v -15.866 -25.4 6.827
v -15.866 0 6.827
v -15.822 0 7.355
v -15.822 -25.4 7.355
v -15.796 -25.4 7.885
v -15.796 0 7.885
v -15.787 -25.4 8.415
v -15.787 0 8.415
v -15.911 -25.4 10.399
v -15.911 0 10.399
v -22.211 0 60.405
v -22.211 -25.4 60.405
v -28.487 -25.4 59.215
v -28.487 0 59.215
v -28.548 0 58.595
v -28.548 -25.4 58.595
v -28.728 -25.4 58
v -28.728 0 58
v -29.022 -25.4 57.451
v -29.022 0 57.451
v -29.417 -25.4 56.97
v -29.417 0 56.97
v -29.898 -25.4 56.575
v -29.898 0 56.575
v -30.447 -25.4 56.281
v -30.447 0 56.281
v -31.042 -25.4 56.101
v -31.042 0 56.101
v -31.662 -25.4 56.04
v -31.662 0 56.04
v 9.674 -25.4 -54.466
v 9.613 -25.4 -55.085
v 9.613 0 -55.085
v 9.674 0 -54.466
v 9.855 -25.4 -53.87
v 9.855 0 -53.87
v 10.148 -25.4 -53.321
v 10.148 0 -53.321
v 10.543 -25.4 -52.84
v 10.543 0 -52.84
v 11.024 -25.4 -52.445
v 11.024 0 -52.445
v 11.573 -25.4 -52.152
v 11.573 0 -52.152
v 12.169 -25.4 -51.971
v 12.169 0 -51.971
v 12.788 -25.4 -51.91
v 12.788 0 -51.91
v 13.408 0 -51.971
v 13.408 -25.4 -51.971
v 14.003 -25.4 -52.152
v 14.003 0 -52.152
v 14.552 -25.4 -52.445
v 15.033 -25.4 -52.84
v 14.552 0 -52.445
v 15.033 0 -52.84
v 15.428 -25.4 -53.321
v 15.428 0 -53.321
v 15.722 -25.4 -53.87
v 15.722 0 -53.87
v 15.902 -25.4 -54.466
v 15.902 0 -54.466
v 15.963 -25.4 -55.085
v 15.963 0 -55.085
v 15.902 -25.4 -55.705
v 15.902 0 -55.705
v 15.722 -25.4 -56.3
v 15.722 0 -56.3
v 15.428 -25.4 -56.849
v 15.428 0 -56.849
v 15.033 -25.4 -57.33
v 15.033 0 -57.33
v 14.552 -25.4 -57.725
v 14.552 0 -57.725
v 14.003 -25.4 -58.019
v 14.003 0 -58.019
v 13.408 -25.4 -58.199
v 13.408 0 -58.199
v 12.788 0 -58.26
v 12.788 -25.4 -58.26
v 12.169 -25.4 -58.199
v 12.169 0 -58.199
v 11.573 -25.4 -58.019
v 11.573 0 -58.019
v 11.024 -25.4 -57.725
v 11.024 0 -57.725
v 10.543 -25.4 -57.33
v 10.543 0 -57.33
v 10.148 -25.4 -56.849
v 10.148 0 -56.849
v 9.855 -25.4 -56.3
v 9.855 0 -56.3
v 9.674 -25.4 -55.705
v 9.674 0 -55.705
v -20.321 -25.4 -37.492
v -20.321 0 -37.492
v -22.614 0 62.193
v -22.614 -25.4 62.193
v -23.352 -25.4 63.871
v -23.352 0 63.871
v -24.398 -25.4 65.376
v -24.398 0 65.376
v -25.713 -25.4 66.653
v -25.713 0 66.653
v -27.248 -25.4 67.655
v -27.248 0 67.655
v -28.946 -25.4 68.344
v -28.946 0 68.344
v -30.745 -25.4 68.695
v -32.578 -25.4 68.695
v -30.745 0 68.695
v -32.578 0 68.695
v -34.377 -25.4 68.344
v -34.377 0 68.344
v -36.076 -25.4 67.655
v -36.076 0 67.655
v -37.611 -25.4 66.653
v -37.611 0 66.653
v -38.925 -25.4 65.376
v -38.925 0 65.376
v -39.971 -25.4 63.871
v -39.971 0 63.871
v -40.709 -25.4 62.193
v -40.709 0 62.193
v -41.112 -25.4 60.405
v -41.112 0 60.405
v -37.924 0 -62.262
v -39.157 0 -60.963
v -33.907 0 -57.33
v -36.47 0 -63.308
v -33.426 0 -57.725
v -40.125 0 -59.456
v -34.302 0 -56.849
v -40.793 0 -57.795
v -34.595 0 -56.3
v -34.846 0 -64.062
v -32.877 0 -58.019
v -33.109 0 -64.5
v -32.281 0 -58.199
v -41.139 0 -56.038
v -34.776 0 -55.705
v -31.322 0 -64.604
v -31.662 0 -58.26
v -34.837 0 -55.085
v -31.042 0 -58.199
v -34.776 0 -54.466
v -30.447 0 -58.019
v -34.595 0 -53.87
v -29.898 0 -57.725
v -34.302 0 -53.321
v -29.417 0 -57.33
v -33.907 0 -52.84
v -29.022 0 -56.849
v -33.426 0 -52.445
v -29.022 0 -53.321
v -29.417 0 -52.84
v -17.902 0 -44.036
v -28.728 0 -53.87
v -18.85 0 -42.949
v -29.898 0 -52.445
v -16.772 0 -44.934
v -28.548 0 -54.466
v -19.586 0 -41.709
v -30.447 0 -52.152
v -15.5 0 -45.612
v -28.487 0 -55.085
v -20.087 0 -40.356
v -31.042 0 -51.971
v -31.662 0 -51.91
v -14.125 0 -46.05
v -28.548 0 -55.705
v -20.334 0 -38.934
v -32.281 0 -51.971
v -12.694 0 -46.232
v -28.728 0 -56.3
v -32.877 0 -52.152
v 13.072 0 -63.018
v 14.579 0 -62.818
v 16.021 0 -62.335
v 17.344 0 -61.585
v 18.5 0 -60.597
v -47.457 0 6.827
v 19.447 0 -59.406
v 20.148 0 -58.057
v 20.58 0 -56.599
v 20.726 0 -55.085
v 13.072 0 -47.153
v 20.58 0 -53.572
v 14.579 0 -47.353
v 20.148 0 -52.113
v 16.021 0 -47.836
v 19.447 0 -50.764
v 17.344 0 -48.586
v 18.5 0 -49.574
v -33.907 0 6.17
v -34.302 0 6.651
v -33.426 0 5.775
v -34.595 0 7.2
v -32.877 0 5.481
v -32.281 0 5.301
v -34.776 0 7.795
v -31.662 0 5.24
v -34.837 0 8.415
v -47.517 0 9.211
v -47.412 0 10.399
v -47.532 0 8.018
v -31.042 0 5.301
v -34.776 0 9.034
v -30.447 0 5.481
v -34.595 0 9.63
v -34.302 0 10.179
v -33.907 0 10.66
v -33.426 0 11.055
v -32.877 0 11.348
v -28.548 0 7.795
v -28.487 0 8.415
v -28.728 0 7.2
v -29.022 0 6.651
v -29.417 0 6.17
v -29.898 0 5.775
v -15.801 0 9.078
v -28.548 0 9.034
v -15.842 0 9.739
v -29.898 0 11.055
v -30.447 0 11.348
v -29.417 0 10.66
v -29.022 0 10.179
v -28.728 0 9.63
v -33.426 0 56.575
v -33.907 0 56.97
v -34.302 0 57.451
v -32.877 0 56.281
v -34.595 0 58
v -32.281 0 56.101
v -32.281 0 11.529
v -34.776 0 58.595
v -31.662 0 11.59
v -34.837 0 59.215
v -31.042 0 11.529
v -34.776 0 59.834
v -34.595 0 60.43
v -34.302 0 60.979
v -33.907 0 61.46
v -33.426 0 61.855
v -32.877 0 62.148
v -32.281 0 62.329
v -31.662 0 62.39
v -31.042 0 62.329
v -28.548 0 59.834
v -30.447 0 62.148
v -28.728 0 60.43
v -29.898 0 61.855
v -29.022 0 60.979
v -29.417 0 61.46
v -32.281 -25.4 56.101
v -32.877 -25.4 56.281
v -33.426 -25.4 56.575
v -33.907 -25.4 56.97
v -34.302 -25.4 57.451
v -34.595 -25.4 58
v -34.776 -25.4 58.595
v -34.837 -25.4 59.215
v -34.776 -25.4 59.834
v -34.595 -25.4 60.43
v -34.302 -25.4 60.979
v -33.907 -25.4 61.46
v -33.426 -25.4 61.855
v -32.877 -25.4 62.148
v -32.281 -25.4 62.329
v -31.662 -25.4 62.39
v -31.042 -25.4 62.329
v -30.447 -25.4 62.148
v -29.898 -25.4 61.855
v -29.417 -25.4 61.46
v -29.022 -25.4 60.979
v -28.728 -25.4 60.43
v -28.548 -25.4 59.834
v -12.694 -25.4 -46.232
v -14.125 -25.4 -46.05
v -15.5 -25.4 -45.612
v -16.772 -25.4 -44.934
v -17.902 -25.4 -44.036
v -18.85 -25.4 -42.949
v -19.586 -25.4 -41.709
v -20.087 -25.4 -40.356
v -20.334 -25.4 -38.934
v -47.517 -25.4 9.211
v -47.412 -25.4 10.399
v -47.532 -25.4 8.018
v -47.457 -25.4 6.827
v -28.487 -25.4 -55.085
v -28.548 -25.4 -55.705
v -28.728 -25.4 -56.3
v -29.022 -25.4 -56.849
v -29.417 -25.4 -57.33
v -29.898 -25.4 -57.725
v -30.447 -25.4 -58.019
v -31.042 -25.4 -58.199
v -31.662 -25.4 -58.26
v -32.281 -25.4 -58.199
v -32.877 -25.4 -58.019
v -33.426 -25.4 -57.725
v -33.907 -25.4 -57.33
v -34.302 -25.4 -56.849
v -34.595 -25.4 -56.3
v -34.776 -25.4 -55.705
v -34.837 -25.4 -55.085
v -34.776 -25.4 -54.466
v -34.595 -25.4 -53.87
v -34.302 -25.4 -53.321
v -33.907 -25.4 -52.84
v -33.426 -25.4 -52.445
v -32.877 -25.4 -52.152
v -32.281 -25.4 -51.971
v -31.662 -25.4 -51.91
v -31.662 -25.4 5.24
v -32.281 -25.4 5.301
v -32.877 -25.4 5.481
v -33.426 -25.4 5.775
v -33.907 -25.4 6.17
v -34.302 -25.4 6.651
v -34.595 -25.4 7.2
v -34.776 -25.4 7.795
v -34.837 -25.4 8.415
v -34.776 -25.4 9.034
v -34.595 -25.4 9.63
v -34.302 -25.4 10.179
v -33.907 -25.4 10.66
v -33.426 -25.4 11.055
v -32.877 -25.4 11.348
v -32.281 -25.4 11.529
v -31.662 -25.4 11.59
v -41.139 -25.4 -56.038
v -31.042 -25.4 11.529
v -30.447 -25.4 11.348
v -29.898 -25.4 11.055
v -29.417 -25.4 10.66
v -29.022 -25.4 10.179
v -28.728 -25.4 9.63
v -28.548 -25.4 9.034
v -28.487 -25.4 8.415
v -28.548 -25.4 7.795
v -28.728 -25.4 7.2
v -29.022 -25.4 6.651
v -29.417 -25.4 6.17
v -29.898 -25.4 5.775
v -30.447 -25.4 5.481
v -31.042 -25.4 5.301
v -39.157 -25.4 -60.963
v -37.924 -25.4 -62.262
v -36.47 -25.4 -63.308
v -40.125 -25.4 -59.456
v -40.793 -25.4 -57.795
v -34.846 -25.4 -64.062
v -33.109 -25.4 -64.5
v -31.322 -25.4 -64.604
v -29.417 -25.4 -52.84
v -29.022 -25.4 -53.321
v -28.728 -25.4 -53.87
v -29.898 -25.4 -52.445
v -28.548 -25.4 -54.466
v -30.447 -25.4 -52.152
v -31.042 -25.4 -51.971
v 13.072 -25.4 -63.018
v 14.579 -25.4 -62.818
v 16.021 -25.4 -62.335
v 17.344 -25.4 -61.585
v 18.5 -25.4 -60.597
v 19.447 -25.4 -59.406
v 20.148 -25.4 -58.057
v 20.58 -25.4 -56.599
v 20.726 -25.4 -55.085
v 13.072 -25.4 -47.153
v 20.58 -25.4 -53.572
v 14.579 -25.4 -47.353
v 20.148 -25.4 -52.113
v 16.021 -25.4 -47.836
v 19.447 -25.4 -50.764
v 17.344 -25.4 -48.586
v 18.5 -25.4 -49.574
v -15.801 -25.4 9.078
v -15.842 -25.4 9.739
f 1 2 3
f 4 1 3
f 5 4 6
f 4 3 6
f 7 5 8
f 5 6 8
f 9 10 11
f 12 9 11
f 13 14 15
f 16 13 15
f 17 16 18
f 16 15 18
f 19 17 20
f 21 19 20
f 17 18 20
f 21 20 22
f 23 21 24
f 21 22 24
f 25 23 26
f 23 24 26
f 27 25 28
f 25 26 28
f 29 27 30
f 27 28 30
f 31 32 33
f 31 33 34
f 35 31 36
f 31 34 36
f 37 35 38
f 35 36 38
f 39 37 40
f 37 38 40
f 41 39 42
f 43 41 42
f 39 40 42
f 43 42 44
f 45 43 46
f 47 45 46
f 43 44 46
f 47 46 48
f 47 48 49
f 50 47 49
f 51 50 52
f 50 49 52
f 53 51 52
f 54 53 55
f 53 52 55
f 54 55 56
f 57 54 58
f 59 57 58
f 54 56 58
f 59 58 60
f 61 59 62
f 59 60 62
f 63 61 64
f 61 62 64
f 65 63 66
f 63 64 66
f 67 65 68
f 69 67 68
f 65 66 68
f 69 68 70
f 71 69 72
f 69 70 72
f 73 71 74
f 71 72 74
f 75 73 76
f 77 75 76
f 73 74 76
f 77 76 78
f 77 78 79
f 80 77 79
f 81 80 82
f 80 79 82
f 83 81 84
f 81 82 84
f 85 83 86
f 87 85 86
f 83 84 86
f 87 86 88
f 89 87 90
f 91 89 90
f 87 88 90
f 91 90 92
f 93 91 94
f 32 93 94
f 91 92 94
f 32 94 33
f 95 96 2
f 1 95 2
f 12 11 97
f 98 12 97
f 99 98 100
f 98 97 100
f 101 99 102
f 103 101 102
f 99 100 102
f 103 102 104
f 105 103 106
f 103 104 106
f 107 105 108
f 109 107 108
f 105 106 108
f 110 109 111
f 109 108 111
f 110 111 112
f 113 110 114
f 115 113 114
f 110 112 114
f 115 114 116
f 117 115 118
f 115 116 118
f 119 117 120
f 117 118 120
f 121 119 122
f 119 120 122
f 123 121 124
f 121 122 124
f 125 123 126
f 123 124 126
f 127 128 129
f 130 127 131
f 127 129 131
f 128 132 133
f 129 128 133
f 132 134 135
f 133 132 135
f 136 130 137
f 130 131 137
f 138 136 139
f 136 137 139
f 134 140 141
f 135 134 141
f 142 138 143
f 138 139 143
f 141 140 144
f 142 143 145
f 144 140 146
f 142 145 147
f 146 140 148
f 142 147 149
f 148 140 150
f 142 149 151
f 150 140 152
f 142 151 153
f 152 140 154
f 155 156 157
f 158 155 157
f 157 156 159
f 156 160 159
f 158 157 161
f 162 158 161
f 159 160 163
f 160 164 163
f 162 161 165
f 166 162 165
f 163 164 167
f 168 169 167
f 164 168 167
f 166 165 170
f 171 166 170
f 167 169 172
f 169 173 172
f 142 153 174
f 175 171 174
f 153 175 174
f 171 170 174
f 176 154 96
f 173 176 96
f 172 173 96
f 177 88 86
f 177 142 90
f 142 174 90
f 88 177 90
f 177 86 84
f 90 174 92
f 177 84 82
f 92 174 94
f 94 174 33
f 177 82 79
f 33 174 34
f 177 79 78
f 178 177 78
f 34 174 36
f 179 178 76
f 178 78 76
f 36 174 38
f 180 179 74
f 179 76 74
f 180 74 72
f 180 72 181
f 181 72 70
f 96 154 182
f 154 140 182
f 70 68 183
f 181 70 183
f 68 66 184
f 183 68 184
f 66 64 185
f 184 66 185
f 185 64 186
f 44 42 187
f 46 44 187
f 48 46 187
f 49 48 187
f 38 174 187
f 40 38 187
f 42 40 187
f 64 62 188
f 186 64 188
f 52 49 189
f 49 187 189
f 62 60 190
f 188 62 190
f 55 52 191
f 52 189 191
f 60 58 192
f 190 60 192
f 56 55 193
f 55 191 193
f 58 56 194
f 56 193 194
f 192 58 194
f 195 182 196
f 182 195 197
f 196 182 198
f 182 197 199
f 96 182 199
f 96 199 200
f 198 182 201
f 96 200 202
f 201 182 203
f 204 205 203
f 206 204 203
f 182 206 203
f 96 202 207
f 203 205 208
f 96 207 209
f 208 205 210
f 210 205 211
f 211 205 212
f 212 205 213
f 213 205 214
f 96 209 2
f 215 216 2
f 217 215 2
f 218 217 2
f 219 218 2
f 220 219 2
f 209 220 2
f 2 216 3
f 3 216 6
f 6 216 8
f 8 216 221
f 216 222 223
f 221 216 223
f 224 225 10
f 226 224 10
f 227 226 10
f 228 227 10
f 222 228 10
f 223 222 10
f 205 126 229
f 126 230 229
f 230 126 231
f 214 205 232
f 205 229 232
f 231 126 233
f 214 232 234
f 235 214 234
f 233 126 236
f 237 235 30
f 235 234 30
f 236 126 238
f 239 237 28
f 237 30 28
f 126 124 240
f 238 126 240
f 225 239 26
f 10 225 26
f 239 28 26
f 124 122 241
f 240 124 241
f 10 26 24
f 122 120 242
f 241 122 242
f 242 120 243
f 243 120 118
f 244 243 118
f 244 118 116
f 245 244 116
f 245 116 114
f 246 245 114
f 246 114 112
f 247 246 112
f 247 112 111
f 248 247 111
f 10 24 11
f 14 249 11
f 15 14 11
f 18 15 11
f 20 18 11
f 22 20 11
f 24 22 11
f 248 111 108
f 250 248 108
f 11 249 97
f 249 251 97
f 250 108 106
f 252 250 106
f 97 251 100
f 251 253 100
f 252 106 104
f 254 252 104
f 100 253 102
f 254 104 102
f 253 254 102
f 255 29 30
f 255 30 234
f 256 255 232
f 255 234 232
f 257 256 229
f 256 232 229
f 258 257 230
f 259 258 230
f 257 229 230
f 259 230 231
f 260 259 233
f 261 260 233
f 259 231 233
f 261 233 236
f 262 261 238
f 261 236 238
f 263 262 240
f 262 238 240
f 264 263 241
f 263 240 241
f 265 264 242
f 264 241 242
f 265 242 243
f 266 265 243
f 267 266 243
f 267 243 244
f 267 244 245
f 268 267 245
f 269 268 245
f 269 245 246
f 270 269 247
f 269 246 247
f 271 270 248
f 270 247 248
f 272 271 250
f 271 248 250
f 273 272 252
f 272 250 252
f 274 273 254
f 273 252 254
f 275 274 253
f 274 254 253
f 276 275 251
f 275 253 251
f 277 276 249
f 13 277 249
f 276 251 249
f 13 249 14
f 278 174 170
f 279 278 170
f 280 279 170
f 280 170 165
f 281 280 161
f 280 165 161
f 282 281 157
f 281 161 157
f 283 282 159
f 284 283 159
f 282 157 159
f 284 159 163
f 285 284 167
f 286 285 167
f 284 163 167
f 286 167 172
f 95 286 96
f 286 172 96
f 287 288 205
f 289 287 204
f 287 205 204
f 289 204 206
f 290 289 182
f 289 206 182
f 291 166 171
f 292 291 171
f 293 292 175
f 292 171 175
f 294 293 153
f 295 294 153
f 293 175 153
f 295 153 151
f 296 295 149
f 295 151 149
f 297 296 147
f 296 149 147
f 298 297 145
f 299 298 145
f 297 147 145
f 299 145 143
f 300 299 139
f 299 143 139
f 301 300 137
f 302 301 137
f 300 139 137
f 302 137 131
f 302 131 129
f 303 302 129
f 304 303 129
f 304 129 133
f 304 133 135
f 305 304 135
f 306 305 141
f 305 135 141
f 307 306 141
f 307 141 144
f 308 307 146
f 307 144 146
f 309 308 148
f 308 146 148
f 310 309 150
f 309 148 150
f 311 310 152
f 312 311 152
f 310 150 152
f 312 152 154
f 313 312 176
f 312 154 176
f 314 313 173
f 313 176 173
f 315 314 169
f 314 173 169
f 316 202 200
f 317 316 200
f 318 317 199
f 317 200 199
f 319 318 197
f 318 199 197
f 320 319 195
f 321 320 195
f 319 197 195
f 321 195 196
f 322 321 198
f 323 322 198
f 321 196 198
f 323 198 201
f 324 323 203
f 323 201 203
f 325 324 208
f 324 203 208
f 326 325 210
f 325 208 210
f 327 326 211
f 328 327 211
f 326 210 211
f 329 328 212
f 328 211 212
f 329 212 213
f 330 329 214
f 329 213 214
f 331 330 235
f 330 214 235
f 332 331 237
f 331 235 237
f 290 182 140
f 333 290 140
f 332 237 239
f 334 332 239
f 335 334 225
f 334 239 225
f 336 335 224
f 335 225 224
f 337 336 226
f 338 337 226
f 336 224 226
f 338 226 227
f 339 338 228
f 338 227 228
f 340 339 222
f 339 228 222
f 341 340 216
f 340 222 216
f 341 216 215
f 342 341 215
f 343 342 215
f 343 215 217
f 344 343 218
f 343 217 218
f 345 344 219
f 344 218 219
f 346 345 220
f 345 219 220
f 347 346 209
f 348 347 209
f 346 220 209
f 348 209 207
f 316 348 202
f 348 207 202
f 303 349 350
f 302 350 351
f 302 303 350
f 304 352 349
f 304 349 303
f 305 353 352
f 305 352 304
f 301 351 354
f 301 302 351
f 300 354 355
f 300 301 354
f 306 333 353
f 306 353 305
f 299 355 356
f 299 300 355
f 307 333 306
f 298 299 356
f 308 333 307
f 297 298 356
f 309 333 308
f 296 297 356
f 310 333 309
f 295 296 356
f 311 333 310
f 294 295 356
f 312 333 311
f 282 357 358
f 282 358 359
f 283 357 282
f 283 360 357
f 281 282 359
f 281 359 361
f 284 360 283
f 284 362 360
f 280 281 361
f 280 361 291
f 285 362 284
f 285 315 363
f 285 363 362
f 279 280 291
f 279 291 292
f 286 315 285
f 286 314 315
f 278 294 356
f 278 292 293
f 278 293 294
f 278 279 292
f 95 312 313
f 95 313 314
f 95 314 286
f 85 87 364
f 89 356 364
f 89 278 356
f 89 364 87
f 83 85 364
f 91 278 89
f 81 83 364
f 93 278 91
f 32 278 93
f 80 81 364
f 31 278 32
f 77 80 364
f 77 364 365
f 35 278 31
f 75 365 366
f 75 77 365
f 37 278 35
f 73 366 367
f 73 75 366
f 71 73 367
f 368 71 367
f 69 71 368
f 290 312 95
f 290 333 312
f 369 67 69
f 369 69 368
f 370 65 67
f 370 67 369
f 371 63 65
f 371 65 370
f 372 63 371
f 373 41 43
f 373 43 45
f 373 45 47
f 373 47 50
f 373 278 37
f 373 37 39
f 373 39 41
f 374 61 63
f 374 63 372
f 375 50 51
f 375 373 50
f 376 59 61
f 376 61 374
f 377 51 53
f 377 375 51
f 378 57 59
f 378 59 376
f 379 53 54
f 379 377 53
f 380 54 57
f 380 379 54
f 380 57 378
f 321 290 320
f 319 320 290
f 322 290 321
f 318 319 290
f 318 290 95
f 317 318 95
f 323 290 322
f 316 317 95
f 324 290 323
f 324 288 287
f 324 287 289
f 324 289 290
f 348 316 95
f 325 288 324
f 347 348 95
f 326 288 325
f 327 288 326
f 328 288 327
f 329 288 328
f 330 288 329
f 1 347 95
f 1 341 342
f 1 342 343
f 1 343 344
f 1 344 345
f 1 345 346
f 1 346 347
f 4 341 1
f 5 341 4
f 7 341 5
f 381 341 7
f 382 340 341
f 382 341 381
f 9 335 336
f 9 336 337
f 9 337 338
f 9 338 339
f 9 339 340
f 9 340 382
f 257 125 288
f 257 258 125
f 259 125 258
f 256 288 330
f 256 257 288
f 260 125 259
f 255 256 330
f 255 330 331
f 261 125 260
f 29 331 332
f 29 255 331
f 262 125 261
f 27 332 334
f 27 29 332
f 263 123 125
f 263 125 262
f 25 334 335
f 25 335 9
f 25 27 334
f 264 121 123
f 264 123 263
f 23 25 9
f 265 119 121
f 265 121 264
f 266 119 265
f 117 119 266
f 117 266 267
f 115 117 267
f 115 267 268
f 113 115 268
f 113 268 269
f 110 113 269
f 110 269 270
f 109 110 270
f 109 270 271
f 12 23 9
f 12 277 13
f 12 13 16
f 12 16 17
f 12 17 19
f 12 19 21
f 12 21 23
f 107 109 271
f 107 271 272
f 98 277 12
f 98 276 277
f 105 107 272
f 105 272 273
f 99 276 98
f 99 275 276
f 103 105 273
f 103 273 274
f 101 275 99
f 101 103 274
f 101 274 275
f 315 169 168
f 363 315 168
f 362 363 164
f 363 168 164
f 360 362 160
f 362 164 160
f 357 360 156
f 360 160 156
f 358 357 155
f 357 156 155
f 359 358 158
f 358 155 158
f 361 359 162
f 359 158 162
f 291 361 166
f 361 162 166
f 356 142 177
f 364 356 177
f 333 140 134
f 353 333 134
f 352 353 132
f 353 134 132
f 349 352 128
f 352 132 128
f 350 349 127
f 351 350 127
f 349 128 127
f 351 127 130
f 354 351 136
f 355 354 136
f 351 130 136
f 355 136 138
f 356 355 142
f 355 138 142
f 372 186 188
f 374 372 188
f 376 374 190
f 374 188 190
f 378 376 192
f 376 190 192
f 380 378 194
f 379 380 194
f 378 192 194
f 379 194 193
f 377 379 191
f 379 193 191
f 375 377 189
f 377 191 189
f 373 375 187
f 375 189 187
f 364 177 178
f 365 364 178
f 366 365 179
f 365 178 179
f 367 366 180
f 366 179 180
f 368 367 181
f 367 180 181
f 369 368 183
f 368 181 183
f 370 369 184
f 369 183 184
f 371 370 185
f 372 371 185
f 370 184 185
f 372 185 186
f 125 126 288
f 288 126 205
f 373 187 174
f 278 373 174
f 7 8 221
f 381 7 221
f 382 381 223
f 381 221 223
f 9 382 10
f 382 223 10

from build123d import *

# Parameters (mm, degrees)
F1_DEPTH = 25.4


with BuildPart() as f1:
    # F0 (on Front) → F1 (new body)
    with BuildSketch(Plane.XZ):
        with BuildLine():
            ThreePointArc((-41.1120045974, 60.4052241132), (-38.8054616332, 52.9144038037), (-31.6617116332, 49.6895991132))
            ThreePointArc((-31.6617116332, 49.6895991132), (-24.9265195424, 52.4794070224), (-22.1367116332, 59.2145991132))
            ThreePointArc((-22.1367116332, 59.2145991132), (-22.155406739, 59.8110823551), (-22.211418669, 60.4052241132))
            ThreePointArc((-22.211418669, 60.4052241132), (-31.6617116332, 68.7395991132), (-41.1120045974, 60.4052241132))
        make_face()
        with BuildLine():
            ThreePointArc((-28.4867116332, 59.2145991132), (-29.4166476029, 56.9695350829), (-31.6617116332, 56.0395991132))
            ThreePointArc((-31.6617116332, 56.0395991132), (-33.9067756635, 61.4596631434), (-28.4867116332, 59.2145991132))
        make_face(mode=Mode.SUBTRACT)
        with BuildLine():
            ThreePointArc((-22.1367116332, 59.2145991132), (-24.9265195424, 52.4794070224), (-31.6617116332, 49.6895991132))
            Line((-31.6617116332, 49.6895991132), (-31.6617116332, 24.2895991132))
            ThreePointArc((-31.6617116332, 24.2895991132), (-21.1613861174, 20.3208491132), (-15.9112233595, 10.3989741132))
            Line((-15.9112233595, 10.3989741132), (-22.211418669, 60.4052241132))
            ThreePointArc((-22.211418669, 60.4052241132), (-22.155406739, 59.8110823551), (-22.1367116332, 59.2145991132))
        make_face()
        with BuildLine():
            Line((-31.6617116332, 24.2895991132), (-31.6617116332, 49.6895991132))
            ThreePointArc((-31.6617116332, 49.6895991132), (-38.8054616332, 52.9144038037), (-41.1120045974, 60.4052241132))
            Line((-41.1120045974, 60.4052241132), (-47.4121999069, 10.3989741132))
            ThreePointArc((-47.4121999069, 10.3989741132), (-42.162037149, 20.3208491132), (-31.6617116332, 24.2895991132))
        make_face()
        with BuildLine():
            ThreePointArc((-15.9112233595, 10.3989741132), (-21.1613861174, 20.3208491132), (-31.6617116332, 24.2895991132))
            Line((-31.6617116332, 24.2895991132), (-31.6617116332, 11.5895991132))
            ThreePointArc((-31.6617116332, 11.5895991132), (-29.4166476029, 10.6596631434), (-28.4867116332, 8.4145991132))
            ThreePointArc((-28.4867116332, 8.4145991132), (-29.4166476029, 6.1695350829), (-31.6617116332, 5.2395991132))
            Line((-31.6617116332, 5.2395991132), (-31.6617116332, -7.4604008868))
            ThreePointArc((-31.6617116332, -7.4604008868), (-21.0124378904, -3.3586159851), (-15.8662860691, 6.8270991132))
            ThreePointArc((-15.8662860691, 6.8270991132), (-15.8066177226, 7.6198525591), (-15.7867116332, 8.4145991132))
            ThreePointArc((-15.7867116332, 8.4145991132), (-15.8178701428, 9.4087378498), (-15.9112233595, 10.3989741132))
        make_face()
        with BuildLine():
            Line((-31.6617116332, 11.5895991132), (-31.6617116332, 24.2895991132))
            ThreePointArc((-31.6617116332, 24.2895991132), (-42.162037149, 20.3208491132), (-47.4121999069, 10.3989741132))
            ThreePointArc((-47.4121999069, 10.3989741132), (-47.5354554487, 8.6143045999), (-47.4571371973, 6.8270991132))
            ThreePointArc((-47.4571371973, 6.8270991132), (-42.310985376, -3.3586159851), (-31.6617116332, -7.4604008868))
            Line((-31.6617116332, -7.4604008868), (-31.6617116332, 5.2395991132))
            ThreePointArc((-31.6617116332, 5.2395991132), (-34.8367116332, 8.4145991132), (-31.6617116332, 11.5895991132))
        make_face()
        with BuildLine():
            ThreePointArc((-31.6617116332, -7.4604008868), (-42.310985376, -3.3586159851), (-47.4571371973, 6.8270991132))
            Line((-47.4571371973, 6.8270991132), (-41.1389669716, -56.0379008868))
            ThreePointArc((-41.1389669716, -56.0379008868), (-38.7256406922, -48.6958366411), (-31.6617116332, -45.5604008868))
            Line((-31.6617116332, -45.5604008868), (-31.6617116332, -7.4604008868))
        make_face()
        with BuildLine():
            ThreePointArc((-15.8662860691, 6.8270991132), (-21.0124378904, -3.3586159851), (-31.6617116332, -7.4604008868))
            Line((-31.6617116332, -7.4604008868), (-31.6617116332, -45.5604008868))
            ThreePointArc((-31.6617116332, -45.5604008868), (-24.9265195424, -48.350208796), (-22.1367116332, -55.0854008868))
            Line((-22.1367116332, -55.0854008868), (4.8507883668, -55.0854008868))
            ThreePointArc((4.8507883668, -55.0854008868), (7.2767655853, -49.3733939821), (13.0717705097, -47.1529646832))
            Line((13.0717705097, -47.1529646832), (-12.6941116327, -46.232167176))
            ThreePointArc((-12.6941116327, -46.232167176), (-18.4005117359, -43.514041737), (-20.3205250409, -37.4920190744))
            Line((-20.3205250409, -37.4920190744), (-15.8662860691, 6.8270991132))
        make_face()
        with BuildLine():
            ThreePointArc((-31.6617116332, -45.5604008868), (-38.7256406922, -48.6958366411), (-41.1389669716, -56.0379008868))
            ThreePointArc((-41.1389669716, -56.0379008868), (-37.9240950148, -62.2623207959), (-31.3215330618, -64.6043243312))
            ThreePointArc((-31.3215330618, -64.6043243312), (-24.8073033476, -61.6992282246), (-22.1367116332, -55.0854008868))
            Line((-22.1367116332, -55.0854008868), (-28.4867116332, -55.0854008868))
            ThreePointArc((-28.4867116332, -55.0854008868), (-33.9067756635, -57.3304649171), (-31.6617116332, -51.9104008868))
            Line((-31.6617116332, -51.9104008868), (-31.6617116332, -45.5604008868))
        make_face()
        with BuildLine():
            ThreePointArc((-22.1367116332, -55.0854008868), (-24.8073033476, -61.6992282246), (-31.3215330618, -64.6043243312))
            Line((-31.3215330618, -64.6043243312), (13.0717705097, -63.0178370905))
            ThreePointArc((13.0717705097, -63.0178370905), (7.2767655853, -60.7974077915), (4.8507883668, -55.0854008868))
            Line((4.8507883668, -55.0854008868), (-22.1367116332, -55.0854008868))
        make_face()
        with BuildLine():
            ThreePointArc((4.8507883668, -55.0854008868), (7.2767655853, -60.7974077915), (13.0717705097, -63.0178370905))
            ThreePointArc((13.0717705097, -63.0178370905), (18.5002952715, -60.5969236683), (20.7257883668, -55.0854008868))
            ThreePointArc((20.7257883668, -55.0854008868), (18.5002952715, -49.5738781054), (13.0717705097, -47.1529646832))
            ThreePointArc((13.0717705097, -47.1529646832), (7.2767655853, -49.3733939821), (4.8507883668, -55.0854008868))
        make_face()
        with BuildLine():
            ThreePointArc((15.9632883668, -55.0854008868), (12.7882883668, -58.2604008868), (9.6132883668, -55.0854008868))
            ThreePointArc((9.6132883668, -55.0854008868), (12.7882883668, -51.9104008868), (15.9632883668, -55.0854008868))
        make_face(mode=Mode.SUBTRACT)
        with BuildLine():
            ThreePointArc((-22.1367116332, -55.0854008868), (-24.9265195424, -48.350208796), (-31.6617116332, -45.5604008868))
            Line((-31.6617116332, -45.5604008868), (-31.6617116332, -51.9104008868))
            ThreePointArc((-31.6617116332, -51.9104008868), (-29.4166476029, -52.8403368566), (-28.4867116332, -55.0854008868))
            Line((-28.4867116332, -55.0854008868), (-22.1367116332, -55.0854008868))
        make_face()
    extrude(amount=F1_DEPTH)


solid = f1.part
